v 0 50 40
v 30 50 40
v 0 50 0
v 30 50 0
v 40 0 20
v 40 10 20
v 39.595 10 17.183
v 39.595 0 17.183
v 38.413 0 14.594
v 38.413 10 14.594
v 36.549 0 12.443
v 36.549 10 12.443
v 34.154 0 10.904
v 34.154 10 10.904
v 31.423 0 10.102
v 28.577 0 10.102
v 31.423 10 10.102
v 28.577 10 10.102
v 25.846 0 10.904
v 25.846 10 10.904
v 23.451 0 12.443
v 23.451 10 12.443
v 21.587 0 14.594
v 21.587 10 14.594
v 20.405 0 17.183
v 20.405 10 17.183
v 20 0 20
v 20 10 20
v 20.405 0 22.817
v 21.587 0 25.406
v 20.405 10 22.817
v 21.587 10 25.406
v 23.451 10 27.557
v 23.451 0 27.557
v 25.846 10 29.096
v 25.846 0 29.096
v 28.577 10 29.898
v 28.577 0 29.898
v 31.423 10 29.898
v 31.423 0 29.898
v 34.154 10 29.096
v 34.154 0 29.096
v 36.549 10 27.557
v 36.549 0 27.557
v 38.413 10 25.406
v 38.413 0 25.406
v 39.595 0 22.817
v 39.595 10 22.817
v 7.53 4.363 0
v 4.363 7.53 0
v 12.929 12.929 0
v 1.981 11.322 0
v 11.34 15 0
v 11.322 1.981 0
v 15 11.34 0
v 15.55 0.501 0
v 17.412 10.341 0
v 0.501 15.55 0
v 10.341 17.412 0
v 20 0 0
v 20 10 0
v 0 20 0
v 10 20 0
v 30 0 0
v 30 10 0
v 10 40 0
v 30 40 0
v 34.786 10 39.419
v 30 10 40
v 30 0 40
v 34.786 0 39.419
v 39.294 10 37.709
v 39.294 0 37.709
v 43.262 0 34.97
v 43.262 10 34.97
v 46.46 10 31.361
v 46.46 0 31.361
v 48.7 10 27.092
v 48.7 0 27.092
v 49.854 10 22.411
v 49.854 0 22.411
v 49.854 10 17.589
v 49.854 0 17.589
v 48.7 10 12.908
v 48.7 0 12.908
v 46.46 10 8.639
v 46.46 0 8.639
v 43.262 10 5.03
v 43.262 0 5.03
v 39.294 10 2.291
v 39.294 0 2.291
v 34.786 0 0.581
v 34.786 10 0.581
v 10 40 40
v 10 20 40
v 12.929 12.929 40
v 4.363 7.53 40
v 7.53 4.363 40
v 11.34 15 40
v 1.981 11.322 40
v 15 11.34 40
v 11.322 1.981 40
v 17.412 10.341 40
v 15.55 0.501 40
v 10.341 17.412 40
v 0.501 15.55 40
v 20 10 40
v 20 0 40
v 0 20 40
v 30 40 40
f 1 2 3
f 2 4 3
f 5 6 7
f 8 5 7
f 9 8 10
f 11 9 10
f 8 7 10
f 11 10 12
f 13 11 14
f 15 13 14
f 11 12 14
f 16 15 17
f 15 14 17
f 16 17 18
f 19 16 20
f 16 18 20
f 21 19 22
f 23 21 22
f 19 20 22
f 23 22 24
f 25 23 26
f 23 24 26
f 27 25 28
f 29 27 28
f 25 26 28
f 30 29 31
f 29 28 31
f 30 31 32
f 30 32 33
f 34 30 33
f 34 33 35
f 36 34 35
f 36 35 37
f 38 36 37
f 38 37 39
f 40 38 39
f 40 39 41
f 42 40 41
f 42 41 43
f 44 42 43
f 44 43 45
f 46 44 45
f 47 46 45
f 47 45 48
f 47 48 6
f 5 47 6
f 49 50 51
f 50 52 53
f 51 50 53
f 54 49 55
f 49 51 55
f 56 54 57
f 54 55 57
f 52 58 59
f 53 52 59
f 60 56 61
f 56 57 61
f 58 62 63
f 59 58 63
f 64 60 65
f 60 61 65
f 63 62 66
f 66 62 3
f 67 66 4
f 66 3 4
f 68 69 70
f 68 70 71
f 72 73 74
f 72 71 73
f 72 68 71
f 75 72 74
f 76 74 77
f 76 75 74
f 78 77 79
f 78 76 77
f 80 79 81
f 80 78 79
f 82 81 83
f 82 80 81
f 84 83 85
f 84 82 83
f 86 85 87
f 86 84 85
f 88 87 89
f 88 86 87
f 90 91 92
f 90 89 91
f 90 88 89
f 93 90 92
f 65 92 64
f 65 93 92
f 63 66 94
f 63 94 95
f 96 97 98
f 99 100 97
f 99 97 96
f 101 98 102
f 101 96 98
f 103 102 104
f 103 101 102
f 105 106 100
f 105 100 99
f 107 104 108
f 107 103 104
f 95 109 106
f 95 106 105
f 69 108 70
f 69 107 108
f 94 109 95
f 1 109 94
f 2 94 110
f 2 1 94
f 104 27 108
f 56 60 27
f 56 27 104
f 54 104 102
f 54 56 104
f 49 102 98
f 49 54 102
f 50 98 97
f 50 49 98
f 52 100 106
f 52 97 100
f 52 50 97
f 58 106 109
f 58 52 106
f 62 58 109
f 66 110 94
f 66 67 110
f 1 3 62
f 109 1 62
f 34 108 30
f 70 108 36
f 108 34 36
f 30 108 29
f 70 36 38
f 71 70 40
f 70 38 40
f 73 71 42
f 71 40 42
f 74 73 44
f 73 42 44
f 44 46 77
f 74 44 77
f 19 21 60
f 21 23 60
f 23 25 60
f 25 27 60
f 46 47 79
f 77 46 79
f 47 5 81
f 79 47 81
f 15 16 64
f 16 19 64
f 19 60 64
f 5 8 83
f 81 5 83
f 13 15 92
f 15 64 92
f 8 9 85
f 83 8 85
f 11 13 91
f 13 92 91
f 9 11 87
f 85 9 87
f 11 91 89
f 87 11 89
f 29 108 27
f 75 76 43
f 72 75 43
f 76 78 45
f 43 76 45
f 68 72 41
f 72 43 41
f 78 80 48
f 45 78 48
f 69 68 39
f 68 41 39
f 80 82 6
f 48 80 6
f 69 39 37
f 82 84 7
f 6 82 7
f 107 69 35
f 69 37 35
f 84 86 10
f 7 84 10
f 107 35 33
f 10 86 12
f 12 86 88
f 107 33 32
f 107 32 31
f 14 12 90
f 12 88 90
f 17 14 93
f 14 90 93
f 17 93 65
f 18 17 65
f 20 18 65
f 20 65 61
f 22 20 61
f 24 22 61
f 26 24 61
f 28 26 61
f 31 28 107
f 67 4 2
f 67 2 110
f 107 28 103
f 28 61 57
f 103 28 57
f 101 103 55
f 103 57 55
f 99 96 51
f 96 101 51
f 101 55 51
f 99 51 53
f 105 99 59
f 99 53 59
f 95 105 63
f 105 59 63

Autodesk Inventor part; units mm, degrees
ref_plane "YZ Plane" through (0, 0, 0) normal (1, 0, 0) x (0, 1, 0)
ref_plane "XZ Plane" through (0, 0, 0) normal (0, 1, 0) x (-1, 0, 0)
ref_plane "XY Plane" through (0, 0, 0) normal (0, 0, 1) x (1, 0, 0)
sketch "草圖1" plane through (0, 0, 0) normal (0, 0, 1) x (1, 0, 0)
  line L0 (20, 0) -> (40, 0)
  line L1 (30, 50) -> (0, 50)
  line L2 (0, 50) -> (0, 20)
  arc A0 (0, 20) -> (20, 0) centre (20, 20) ccw
  line L3 (30, 50) -> (30, 40)
  line L4 (30, 40) -> (10, 40)
  line L5 (10, 40) -> (10, 20)
  arc A1 (10, 20) -> (20, 10) centre (20, 20) ccw
  line L6 (40, 10) -> (20, 10)
  line L7 (40, 0) -> (50, 0)
  line L8 (50, 0) -> (50, 10)
  line L9 (50, 10) -> (40, 10)
  point P0 (0, 0)
  dimension "d0" = 30
  dimension "d1" = 10
  dimension "d9" = 10
  dimension "d10" = 20
  dimension "d11" = 20
  dimension "d17" = 10
  dimension "d18" = 10
extrude "擠出1" add sketch "草圖1" along normal blind 40
sketch "草圖2" plane through (20, 10, 0) normal (0, 1, 0) x (1, 0, 0)
  circle A0 centre (10, -20) radius 10
  point P0 (-20, 0)
  dimension "d14" = 20
extrude "擠出2" cut sketch "草圖2" against normal blind 40
sketch "草圖3" plane through (20, 10, 0) normal (0, 1, 0) x (1, 0, 0)
  line L0 (30, 0) -> (0, 0) projected
  line L1 (30, 0) -> (30, -40) projected
  line L2 (30, -40) -> (0, -40) projected
  arc A0 (10, -40) -> (10, 0) centre (10, -20) ccw
  line L3 (10, -40) -> (30, -40)
  line L4 (30, -20) -> (30, 0)
  point P0 (-20, 0)
  dimension "d20" = 40
extrude "擠出3" cut sketch "草圖3" against normal blind 40
properties part number "40823233"
